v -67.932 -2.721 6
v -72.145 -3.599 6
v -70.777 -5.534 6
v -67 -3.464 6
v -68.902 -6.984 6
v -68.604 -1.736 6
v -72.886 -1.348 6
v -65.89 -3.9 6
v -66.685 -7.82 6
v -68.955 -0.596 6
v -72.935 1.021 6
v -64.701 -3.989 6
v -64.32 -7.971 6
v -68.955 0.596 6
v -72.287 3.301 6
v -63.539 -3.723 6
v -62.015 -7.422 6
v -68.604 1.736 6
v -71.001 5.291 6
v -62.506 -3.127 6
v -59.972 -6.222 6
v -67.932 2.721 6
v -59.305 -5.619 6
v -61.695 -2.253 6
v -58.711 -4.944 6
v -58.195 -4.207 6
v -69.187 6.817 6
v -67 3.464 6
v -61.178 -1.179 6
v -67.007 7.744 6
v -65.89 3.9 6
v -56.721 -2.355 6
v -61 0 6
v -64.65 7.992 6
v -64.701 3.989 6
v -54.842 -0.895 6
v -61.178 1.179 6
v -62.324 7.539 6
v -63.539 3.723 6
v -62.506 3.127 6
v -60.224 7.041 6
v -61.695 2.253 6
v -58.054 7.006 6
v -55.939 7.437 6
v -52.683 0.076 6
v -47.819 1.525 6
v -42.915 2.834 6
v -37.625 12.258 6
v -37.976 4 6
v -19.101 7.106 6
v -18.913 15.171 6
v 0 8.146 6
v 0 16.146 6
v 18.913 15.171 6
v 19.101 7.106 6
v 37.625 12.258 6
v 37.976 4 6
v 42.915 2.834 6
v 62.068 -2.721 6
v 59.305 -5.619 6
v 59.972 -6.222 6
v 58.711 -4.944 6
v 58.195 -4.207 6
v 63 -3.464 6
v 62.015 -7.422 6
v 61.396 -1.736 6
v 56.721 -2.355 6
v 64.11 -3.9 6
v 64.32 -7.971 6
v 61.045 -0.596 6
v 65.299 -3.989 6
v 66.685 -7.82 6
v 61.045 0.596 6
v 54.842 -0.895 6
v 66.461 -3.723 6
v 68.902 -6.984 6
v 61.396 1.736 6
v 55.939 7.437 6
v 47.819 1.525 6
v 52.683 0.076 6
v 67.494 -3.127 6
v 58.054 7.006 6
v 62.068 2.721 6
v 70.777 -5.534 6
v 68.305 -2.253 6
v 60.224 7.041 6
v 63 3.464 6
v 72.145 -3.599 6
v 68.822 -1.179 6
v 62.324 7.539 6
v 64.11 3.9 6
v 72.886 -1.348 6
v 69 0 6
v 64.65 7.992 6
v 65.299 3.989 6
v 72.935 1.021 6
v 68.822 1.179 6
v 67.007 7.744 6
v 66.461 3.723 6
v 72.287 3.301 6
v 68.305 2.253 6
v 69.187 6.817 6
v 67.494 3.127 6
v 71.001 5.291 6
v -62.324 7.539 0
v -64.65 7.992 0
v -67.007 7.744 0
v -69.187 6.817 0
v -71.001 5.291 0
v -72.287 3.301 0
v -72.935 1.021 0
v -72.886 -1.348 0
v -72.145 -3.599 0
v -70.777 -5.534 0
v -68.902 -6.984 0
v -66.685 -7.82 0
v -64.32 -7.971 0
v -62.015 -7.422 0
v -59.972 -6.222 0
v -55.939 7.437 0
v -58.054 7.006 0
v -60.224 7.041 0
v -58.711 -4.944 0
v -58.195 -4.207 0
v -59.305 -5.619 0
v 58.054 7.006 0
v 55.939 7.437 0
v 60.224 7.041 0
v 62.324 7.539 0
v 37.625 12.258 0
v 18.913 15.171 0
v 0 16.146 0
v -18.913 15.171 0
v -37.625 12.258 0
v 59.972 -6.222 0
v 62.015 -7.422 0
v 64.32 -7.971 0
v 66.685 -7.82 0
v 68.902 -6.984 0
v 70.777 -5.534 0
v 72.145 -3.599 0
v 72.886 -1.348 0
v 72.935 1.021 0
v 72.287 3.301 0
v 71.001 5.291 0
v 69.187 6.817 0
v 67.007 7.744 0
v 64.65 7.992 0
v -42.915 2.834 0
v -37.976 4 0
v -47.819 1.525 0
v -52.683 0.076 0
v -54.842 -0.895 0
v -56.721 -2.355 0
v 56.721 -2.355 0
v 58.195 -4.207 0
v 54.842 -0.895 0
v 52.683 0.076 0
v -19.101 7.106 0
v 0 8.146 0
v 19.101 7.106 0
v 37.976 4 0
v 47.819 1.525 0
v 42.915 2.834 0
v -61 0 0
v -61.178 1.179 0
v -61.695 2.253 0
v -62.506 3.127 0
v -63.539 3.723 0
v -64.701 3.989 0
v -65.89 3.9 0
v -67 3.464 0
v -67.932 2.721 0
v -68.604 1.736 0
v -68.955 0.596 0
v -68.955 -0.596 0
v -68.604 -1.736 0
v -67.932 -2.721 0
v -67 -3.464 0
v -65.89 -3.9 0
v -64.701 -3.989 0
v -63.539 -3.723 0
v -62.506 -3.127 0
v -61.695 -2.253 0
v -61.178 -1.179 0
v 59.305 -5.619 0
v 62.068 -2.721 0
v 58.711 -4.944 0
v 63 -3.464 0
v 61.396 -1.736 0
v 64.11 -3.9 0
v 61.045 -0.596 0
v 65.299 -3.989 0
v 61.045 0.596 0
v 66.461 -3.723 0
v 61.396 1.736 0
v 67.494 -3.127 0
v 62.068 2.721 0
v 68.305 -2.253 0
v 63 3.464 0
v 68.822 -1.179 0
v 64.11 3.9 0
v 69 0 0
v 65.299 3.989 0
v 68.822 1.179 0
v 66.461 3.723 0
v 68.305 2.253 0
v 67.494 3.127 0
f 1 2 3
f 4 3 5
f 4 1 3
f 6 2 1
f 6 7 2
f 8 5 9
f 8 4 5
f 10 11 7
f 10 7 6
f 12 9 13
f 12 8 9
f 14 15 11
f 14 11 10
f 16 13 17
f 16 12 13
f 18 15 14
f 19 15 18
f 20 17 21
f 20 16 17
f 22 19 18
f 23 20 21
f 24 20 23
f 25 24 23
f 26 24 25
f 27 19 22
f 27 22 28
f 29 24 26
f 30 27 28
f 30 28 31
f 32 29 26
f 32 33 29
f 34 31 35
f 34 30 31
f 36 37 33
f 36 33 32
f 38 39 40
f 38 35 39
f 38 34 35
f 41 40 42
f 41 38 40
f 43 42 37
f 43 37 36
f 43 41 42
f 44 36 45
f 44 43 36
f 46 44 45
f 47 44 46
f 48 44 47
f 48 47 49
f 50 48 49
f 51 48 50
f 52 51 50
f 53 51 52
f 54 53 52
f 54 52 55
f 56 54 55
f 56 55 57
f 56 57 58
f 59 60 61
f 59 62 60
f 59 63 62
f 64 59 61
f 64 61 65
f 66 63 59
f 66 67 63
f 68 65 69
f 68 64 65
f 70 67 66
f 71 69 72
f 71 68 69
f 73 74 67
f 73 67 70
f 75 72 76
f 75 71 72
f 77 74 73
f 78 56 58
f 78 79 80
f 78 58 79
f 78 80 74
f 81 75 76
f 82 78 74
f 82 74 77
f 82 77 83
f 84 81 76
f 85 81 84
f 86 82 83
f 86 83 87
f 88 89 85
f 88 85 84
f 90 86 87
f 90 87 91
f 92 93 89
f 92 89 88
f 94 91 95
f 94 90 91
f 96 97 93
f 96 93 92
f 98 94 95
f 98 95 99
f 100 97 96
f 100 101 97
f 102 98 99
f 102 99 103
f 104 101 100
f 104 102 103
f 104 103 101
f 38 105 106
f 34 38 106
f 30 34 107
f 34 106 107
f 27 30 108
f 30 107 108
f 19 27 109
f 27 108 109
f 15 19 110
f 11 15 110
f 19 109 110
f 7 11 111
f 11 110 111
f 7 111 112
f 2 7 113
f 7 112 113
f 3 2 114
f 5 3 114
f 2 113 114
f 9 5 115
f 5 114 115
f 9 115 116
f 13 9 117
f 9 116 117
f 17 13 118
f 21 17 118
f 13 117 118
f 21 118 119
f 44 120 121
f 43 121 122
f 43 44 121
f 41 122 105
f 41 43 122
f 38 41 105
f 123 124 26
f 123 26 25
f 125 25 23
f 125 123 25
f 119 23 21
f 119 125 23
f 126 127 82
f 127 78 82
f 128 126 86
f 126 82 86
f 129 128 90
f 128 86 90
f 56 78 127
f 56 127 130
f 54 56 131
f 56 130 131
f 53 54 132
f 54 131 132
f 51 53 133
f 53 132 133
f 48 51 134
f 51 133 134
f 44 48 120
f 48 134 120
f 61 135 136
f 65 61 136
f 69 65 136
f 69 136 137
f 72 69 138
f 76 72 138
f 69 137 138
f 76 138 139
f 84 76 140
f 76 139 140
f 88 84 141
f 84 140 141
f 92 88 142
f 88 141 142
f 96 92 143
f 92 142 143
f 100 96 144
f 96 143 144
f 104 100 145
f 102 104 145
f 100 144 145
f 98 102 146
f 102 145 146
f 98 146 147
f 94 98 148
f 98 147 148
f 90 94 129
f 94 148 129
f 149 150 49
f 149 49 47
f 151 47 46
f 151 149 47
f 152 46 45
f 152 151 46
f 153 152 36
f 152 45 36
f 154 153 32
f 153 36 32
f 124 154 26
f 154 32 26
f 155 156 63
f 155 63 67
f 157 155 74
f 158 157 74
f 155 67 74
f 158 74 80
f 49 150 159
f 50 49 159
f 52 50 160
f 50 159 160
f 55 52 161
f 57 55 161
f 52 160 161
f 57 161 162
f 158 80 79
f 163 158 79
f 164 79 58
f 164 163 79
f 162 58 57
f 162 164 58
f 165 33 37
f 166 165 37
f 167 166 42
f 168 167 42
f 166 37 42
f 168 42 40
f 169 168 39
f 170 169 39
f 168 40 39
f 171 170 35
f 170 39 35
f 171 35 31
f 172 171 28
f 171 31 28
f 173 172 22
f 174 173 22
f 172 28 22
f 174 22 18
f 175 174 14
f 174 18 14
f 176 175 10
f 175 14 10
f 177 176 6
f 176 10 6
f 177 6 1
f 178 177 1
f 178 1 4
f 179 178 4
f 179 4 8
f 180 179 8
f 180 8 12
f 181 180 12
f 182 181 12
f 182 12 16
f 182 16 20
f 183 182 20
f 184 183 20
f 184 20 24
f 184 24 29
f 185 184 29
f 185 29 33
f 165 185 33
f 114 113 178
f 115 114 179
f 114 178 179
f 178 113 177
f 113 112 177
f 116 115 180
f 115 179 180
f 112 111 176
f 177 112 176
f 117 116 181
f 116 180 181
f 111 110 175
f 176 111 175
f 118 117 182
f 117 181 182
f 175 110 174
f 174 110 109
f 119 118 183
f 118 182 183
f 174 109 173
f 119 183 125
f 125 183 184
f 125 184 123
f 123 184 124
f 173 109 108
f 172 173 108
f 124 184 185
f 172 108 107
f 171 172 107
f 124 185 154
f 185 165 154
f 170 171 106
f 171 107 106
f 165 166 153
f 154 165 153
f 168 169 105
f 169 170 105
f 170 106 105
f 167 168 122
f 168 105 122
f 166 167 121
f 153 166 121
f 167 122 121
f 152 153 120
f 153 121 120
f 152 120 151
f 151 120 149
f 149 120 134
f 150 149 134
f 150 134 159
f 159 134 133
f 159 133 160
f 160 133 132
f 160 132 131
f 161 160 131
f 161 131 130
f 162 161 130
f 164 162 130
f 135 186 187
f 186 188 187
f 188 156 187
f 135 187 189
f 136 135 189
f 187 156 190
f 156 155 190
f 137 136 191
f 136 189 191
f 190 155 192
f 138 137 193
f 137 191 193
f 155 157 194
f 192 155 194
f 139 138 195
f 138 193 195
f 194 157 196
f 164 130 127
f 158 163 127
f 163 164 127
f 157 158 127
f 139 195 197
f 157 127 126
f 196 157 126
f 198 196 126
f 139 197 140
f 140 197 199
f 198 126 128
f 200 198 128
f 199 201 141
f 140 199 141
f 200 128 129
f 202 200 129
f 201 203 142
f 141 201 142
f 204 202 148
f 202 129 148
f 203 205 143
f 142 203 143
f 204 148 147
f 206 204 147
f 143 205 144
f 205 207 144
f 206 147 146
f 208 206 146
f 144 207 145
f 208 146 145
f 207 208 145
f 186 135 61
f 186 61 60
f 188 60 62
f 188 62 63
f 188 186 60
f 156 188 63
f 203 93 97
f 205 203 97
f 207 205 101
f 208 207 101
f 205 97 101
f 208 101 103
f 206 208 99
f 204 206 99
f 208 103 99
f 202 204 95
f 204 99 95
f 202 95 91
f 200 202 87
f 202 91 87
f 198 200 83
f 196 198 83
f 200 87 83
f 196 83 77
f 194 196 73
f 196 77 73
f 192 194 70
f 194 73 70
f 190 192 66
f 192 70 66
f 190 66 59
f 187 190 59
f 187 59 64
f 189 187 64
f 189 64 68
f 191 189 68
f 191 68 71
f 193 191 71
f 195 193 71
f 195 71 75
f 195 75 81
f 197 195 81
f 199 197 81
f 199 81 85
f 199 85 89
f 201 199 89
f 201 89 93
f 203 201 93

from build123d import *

# Parameters (mm, degrees)
SKETCH_1_R          = 8
EXTRUDE_1_DEPTH     = 6
SKETCH_2_R          = 4
CUT_EXTRUDE_1_DEPTH = 15
FILLET_1_R          = 10
EXTRUDE_START       = -6
EXTRUDE_3_DEPTH     = 6
CUT_EXTRUDE_START   = -6
CUT_EXTRUDE_2_DEPTH = 6
FILLET_2_R          = 10


with BuildPart() as part:
    # 草图1 → 凸台-拉伸1 (new body)
    with BuildSketch(Plane.XY):
        with Locations((-65, 0)):
            Circle(SKETCH_1_R)
        with Locations((65, 0)):
            Circle(SKETCH_1_R)
        with BuildLine():
            Line((-65, 4), (65, 4))
            ThreePointArc((65, 4), (69, 0), (65, -4))
            Line((65, -4), (-65, -4))
            ThreePointArc((-65, -4), (-69, 0), (-65, 4))
        make_face()
    extrude(amount=EXTRUDE_1_DEPTH)

    # 草图2 → 切除-拉伸1 (cut)
    with BuildSketch(Plane.XY.offset(6)):
        with Locations((-65, 0)):
            Circle(SKETCH_2_R)
        with Locations((65, 0)):
            Circle(SKETCH_2_R)
    extrude(amount=-CUT_EXTRUDE_1_DEPTH, mode=Mode.SUBTRACT)

    # 圆角1
    fillet_1_edges = [part.edges().sort_by_distance(p)[0] for p in [
        (58.07179677, -4, 3),
        (-58.07179677, -4, 3),
        (-58.07179677, 4, 3),
        (58.07179677, 4, 3),
    ]]
    fillet(fillet_1_edges, radius=FILLET_1_R)

    # 草图4 → 凸台-拉伸3 (add)
    with BuildSketch(Plane.XY.offset(6).offset(EXTRUDE_START)):
        with BuildLine():
            ThreePointArc((53.536596581, 4), (0, 12.145896684), (-53.536596581, 4))
            Line((-53.536596581, 4), (-37.975876204, 4))
            ThreePointArc((-37.975876204, 4), (0, 8.145896684), (37.975876204, 4))
            Line((37.975876204, 4), (53.536596581, 4))
        make_face()
        with BuildLine():
            ThreePointArc((59.862982118, 6.135618714), (0, 16.145896684), (-59.862982118, 6.135618714))
            ThreePointArc((-59.862982118, 6.135618714), (-56.954026736, 4.54897326), (-53.686291501, 4))
            Line((-53.686291501, 4), (-53.536596581, 4))
            ThreePointArc((-53.536596581, 4), (0, 12.145896684), (53.536596581, 4))
            Line((53.536596581, 4), (53.686291501, 4))
            ThreePointArc((53.686291501, 4), (56.954026736, 4.54897326), (59.862982118, 6.135618714))
        make_face()
    extrude(amount=EXTRUDE_3_DEPTH)

    # 草图5 → 切除-拉伸2 (cut)
    with BuildSketch(Plane.XY.offset(6).offset(CUT_EXTRUDE_START)):
        with BuildLine():
            ThreePointArc((-59.971685112, -6.222222222), (-57.019624834, -4.571909584), (-53.686291501, -4))
            Line((-53.686291501, -4), (53.686291501, -4))
            ThreePointArc((53.686291501, -4), (57.019624834, -4.571909584), (59.971685112, -6.222222222))
            ThreePointArc((59.971685112, -6.222222222), (58.106897, -4.060188546), (57.120098961, -1.380999498))
            ThreePointArc((57.120098961, -1.380999498), (47.624047624, 1.580102463), (37.975876204, 4))
            Line((37.975876204, 4), (-37.975876204, 4))
            ThreePointArc((-37.975876204, 4), (-47.624047624, 1.580102463), (-57.120098961, -1.380999498))
            ThreePointArc((-57.120098961, -1.380999498), (-58.106897, -4.060188546), (-59.971685112, -6.222222222))
        make_face()
    extrude(amount=CUT_EXTRUDE_2_DEPTH, mode=Mode.SUBTRACT)

    # 圆角2
    fillet_2_edges = [part.edges().sort_by_distance(p)[0] for p in [
        (-57.120098961, -1.380999498, 3),
    ]]
    fillet(fillet_2_edges, radius=FILLET_2_R)
    fillet_2_2_edges = [part.edges().sort_by_distance(p)[0] for p in [
        (59.862982118, 6.135618714, 3),
    ]]
    fillet(fillet_2_2_edges, radius=FILLET_2_R)
    fillet_2_3_edges = [part.edges().sort_by_distance(p)[0] for p in [
        (57.120098961, -1.380999498, 3),
    ]]
    fillet(fillet_2_3_edges, radius=FILLET_2_R)
    fillet_2_4_edges = [part.edges().sort_by_distance(p)[0] for p in [
        (-59.862982118, 6.135618714, 3),
    ]]
    fillet(fillet_2_4_edges, radius=FILLET_2_R)


solid = part.part
